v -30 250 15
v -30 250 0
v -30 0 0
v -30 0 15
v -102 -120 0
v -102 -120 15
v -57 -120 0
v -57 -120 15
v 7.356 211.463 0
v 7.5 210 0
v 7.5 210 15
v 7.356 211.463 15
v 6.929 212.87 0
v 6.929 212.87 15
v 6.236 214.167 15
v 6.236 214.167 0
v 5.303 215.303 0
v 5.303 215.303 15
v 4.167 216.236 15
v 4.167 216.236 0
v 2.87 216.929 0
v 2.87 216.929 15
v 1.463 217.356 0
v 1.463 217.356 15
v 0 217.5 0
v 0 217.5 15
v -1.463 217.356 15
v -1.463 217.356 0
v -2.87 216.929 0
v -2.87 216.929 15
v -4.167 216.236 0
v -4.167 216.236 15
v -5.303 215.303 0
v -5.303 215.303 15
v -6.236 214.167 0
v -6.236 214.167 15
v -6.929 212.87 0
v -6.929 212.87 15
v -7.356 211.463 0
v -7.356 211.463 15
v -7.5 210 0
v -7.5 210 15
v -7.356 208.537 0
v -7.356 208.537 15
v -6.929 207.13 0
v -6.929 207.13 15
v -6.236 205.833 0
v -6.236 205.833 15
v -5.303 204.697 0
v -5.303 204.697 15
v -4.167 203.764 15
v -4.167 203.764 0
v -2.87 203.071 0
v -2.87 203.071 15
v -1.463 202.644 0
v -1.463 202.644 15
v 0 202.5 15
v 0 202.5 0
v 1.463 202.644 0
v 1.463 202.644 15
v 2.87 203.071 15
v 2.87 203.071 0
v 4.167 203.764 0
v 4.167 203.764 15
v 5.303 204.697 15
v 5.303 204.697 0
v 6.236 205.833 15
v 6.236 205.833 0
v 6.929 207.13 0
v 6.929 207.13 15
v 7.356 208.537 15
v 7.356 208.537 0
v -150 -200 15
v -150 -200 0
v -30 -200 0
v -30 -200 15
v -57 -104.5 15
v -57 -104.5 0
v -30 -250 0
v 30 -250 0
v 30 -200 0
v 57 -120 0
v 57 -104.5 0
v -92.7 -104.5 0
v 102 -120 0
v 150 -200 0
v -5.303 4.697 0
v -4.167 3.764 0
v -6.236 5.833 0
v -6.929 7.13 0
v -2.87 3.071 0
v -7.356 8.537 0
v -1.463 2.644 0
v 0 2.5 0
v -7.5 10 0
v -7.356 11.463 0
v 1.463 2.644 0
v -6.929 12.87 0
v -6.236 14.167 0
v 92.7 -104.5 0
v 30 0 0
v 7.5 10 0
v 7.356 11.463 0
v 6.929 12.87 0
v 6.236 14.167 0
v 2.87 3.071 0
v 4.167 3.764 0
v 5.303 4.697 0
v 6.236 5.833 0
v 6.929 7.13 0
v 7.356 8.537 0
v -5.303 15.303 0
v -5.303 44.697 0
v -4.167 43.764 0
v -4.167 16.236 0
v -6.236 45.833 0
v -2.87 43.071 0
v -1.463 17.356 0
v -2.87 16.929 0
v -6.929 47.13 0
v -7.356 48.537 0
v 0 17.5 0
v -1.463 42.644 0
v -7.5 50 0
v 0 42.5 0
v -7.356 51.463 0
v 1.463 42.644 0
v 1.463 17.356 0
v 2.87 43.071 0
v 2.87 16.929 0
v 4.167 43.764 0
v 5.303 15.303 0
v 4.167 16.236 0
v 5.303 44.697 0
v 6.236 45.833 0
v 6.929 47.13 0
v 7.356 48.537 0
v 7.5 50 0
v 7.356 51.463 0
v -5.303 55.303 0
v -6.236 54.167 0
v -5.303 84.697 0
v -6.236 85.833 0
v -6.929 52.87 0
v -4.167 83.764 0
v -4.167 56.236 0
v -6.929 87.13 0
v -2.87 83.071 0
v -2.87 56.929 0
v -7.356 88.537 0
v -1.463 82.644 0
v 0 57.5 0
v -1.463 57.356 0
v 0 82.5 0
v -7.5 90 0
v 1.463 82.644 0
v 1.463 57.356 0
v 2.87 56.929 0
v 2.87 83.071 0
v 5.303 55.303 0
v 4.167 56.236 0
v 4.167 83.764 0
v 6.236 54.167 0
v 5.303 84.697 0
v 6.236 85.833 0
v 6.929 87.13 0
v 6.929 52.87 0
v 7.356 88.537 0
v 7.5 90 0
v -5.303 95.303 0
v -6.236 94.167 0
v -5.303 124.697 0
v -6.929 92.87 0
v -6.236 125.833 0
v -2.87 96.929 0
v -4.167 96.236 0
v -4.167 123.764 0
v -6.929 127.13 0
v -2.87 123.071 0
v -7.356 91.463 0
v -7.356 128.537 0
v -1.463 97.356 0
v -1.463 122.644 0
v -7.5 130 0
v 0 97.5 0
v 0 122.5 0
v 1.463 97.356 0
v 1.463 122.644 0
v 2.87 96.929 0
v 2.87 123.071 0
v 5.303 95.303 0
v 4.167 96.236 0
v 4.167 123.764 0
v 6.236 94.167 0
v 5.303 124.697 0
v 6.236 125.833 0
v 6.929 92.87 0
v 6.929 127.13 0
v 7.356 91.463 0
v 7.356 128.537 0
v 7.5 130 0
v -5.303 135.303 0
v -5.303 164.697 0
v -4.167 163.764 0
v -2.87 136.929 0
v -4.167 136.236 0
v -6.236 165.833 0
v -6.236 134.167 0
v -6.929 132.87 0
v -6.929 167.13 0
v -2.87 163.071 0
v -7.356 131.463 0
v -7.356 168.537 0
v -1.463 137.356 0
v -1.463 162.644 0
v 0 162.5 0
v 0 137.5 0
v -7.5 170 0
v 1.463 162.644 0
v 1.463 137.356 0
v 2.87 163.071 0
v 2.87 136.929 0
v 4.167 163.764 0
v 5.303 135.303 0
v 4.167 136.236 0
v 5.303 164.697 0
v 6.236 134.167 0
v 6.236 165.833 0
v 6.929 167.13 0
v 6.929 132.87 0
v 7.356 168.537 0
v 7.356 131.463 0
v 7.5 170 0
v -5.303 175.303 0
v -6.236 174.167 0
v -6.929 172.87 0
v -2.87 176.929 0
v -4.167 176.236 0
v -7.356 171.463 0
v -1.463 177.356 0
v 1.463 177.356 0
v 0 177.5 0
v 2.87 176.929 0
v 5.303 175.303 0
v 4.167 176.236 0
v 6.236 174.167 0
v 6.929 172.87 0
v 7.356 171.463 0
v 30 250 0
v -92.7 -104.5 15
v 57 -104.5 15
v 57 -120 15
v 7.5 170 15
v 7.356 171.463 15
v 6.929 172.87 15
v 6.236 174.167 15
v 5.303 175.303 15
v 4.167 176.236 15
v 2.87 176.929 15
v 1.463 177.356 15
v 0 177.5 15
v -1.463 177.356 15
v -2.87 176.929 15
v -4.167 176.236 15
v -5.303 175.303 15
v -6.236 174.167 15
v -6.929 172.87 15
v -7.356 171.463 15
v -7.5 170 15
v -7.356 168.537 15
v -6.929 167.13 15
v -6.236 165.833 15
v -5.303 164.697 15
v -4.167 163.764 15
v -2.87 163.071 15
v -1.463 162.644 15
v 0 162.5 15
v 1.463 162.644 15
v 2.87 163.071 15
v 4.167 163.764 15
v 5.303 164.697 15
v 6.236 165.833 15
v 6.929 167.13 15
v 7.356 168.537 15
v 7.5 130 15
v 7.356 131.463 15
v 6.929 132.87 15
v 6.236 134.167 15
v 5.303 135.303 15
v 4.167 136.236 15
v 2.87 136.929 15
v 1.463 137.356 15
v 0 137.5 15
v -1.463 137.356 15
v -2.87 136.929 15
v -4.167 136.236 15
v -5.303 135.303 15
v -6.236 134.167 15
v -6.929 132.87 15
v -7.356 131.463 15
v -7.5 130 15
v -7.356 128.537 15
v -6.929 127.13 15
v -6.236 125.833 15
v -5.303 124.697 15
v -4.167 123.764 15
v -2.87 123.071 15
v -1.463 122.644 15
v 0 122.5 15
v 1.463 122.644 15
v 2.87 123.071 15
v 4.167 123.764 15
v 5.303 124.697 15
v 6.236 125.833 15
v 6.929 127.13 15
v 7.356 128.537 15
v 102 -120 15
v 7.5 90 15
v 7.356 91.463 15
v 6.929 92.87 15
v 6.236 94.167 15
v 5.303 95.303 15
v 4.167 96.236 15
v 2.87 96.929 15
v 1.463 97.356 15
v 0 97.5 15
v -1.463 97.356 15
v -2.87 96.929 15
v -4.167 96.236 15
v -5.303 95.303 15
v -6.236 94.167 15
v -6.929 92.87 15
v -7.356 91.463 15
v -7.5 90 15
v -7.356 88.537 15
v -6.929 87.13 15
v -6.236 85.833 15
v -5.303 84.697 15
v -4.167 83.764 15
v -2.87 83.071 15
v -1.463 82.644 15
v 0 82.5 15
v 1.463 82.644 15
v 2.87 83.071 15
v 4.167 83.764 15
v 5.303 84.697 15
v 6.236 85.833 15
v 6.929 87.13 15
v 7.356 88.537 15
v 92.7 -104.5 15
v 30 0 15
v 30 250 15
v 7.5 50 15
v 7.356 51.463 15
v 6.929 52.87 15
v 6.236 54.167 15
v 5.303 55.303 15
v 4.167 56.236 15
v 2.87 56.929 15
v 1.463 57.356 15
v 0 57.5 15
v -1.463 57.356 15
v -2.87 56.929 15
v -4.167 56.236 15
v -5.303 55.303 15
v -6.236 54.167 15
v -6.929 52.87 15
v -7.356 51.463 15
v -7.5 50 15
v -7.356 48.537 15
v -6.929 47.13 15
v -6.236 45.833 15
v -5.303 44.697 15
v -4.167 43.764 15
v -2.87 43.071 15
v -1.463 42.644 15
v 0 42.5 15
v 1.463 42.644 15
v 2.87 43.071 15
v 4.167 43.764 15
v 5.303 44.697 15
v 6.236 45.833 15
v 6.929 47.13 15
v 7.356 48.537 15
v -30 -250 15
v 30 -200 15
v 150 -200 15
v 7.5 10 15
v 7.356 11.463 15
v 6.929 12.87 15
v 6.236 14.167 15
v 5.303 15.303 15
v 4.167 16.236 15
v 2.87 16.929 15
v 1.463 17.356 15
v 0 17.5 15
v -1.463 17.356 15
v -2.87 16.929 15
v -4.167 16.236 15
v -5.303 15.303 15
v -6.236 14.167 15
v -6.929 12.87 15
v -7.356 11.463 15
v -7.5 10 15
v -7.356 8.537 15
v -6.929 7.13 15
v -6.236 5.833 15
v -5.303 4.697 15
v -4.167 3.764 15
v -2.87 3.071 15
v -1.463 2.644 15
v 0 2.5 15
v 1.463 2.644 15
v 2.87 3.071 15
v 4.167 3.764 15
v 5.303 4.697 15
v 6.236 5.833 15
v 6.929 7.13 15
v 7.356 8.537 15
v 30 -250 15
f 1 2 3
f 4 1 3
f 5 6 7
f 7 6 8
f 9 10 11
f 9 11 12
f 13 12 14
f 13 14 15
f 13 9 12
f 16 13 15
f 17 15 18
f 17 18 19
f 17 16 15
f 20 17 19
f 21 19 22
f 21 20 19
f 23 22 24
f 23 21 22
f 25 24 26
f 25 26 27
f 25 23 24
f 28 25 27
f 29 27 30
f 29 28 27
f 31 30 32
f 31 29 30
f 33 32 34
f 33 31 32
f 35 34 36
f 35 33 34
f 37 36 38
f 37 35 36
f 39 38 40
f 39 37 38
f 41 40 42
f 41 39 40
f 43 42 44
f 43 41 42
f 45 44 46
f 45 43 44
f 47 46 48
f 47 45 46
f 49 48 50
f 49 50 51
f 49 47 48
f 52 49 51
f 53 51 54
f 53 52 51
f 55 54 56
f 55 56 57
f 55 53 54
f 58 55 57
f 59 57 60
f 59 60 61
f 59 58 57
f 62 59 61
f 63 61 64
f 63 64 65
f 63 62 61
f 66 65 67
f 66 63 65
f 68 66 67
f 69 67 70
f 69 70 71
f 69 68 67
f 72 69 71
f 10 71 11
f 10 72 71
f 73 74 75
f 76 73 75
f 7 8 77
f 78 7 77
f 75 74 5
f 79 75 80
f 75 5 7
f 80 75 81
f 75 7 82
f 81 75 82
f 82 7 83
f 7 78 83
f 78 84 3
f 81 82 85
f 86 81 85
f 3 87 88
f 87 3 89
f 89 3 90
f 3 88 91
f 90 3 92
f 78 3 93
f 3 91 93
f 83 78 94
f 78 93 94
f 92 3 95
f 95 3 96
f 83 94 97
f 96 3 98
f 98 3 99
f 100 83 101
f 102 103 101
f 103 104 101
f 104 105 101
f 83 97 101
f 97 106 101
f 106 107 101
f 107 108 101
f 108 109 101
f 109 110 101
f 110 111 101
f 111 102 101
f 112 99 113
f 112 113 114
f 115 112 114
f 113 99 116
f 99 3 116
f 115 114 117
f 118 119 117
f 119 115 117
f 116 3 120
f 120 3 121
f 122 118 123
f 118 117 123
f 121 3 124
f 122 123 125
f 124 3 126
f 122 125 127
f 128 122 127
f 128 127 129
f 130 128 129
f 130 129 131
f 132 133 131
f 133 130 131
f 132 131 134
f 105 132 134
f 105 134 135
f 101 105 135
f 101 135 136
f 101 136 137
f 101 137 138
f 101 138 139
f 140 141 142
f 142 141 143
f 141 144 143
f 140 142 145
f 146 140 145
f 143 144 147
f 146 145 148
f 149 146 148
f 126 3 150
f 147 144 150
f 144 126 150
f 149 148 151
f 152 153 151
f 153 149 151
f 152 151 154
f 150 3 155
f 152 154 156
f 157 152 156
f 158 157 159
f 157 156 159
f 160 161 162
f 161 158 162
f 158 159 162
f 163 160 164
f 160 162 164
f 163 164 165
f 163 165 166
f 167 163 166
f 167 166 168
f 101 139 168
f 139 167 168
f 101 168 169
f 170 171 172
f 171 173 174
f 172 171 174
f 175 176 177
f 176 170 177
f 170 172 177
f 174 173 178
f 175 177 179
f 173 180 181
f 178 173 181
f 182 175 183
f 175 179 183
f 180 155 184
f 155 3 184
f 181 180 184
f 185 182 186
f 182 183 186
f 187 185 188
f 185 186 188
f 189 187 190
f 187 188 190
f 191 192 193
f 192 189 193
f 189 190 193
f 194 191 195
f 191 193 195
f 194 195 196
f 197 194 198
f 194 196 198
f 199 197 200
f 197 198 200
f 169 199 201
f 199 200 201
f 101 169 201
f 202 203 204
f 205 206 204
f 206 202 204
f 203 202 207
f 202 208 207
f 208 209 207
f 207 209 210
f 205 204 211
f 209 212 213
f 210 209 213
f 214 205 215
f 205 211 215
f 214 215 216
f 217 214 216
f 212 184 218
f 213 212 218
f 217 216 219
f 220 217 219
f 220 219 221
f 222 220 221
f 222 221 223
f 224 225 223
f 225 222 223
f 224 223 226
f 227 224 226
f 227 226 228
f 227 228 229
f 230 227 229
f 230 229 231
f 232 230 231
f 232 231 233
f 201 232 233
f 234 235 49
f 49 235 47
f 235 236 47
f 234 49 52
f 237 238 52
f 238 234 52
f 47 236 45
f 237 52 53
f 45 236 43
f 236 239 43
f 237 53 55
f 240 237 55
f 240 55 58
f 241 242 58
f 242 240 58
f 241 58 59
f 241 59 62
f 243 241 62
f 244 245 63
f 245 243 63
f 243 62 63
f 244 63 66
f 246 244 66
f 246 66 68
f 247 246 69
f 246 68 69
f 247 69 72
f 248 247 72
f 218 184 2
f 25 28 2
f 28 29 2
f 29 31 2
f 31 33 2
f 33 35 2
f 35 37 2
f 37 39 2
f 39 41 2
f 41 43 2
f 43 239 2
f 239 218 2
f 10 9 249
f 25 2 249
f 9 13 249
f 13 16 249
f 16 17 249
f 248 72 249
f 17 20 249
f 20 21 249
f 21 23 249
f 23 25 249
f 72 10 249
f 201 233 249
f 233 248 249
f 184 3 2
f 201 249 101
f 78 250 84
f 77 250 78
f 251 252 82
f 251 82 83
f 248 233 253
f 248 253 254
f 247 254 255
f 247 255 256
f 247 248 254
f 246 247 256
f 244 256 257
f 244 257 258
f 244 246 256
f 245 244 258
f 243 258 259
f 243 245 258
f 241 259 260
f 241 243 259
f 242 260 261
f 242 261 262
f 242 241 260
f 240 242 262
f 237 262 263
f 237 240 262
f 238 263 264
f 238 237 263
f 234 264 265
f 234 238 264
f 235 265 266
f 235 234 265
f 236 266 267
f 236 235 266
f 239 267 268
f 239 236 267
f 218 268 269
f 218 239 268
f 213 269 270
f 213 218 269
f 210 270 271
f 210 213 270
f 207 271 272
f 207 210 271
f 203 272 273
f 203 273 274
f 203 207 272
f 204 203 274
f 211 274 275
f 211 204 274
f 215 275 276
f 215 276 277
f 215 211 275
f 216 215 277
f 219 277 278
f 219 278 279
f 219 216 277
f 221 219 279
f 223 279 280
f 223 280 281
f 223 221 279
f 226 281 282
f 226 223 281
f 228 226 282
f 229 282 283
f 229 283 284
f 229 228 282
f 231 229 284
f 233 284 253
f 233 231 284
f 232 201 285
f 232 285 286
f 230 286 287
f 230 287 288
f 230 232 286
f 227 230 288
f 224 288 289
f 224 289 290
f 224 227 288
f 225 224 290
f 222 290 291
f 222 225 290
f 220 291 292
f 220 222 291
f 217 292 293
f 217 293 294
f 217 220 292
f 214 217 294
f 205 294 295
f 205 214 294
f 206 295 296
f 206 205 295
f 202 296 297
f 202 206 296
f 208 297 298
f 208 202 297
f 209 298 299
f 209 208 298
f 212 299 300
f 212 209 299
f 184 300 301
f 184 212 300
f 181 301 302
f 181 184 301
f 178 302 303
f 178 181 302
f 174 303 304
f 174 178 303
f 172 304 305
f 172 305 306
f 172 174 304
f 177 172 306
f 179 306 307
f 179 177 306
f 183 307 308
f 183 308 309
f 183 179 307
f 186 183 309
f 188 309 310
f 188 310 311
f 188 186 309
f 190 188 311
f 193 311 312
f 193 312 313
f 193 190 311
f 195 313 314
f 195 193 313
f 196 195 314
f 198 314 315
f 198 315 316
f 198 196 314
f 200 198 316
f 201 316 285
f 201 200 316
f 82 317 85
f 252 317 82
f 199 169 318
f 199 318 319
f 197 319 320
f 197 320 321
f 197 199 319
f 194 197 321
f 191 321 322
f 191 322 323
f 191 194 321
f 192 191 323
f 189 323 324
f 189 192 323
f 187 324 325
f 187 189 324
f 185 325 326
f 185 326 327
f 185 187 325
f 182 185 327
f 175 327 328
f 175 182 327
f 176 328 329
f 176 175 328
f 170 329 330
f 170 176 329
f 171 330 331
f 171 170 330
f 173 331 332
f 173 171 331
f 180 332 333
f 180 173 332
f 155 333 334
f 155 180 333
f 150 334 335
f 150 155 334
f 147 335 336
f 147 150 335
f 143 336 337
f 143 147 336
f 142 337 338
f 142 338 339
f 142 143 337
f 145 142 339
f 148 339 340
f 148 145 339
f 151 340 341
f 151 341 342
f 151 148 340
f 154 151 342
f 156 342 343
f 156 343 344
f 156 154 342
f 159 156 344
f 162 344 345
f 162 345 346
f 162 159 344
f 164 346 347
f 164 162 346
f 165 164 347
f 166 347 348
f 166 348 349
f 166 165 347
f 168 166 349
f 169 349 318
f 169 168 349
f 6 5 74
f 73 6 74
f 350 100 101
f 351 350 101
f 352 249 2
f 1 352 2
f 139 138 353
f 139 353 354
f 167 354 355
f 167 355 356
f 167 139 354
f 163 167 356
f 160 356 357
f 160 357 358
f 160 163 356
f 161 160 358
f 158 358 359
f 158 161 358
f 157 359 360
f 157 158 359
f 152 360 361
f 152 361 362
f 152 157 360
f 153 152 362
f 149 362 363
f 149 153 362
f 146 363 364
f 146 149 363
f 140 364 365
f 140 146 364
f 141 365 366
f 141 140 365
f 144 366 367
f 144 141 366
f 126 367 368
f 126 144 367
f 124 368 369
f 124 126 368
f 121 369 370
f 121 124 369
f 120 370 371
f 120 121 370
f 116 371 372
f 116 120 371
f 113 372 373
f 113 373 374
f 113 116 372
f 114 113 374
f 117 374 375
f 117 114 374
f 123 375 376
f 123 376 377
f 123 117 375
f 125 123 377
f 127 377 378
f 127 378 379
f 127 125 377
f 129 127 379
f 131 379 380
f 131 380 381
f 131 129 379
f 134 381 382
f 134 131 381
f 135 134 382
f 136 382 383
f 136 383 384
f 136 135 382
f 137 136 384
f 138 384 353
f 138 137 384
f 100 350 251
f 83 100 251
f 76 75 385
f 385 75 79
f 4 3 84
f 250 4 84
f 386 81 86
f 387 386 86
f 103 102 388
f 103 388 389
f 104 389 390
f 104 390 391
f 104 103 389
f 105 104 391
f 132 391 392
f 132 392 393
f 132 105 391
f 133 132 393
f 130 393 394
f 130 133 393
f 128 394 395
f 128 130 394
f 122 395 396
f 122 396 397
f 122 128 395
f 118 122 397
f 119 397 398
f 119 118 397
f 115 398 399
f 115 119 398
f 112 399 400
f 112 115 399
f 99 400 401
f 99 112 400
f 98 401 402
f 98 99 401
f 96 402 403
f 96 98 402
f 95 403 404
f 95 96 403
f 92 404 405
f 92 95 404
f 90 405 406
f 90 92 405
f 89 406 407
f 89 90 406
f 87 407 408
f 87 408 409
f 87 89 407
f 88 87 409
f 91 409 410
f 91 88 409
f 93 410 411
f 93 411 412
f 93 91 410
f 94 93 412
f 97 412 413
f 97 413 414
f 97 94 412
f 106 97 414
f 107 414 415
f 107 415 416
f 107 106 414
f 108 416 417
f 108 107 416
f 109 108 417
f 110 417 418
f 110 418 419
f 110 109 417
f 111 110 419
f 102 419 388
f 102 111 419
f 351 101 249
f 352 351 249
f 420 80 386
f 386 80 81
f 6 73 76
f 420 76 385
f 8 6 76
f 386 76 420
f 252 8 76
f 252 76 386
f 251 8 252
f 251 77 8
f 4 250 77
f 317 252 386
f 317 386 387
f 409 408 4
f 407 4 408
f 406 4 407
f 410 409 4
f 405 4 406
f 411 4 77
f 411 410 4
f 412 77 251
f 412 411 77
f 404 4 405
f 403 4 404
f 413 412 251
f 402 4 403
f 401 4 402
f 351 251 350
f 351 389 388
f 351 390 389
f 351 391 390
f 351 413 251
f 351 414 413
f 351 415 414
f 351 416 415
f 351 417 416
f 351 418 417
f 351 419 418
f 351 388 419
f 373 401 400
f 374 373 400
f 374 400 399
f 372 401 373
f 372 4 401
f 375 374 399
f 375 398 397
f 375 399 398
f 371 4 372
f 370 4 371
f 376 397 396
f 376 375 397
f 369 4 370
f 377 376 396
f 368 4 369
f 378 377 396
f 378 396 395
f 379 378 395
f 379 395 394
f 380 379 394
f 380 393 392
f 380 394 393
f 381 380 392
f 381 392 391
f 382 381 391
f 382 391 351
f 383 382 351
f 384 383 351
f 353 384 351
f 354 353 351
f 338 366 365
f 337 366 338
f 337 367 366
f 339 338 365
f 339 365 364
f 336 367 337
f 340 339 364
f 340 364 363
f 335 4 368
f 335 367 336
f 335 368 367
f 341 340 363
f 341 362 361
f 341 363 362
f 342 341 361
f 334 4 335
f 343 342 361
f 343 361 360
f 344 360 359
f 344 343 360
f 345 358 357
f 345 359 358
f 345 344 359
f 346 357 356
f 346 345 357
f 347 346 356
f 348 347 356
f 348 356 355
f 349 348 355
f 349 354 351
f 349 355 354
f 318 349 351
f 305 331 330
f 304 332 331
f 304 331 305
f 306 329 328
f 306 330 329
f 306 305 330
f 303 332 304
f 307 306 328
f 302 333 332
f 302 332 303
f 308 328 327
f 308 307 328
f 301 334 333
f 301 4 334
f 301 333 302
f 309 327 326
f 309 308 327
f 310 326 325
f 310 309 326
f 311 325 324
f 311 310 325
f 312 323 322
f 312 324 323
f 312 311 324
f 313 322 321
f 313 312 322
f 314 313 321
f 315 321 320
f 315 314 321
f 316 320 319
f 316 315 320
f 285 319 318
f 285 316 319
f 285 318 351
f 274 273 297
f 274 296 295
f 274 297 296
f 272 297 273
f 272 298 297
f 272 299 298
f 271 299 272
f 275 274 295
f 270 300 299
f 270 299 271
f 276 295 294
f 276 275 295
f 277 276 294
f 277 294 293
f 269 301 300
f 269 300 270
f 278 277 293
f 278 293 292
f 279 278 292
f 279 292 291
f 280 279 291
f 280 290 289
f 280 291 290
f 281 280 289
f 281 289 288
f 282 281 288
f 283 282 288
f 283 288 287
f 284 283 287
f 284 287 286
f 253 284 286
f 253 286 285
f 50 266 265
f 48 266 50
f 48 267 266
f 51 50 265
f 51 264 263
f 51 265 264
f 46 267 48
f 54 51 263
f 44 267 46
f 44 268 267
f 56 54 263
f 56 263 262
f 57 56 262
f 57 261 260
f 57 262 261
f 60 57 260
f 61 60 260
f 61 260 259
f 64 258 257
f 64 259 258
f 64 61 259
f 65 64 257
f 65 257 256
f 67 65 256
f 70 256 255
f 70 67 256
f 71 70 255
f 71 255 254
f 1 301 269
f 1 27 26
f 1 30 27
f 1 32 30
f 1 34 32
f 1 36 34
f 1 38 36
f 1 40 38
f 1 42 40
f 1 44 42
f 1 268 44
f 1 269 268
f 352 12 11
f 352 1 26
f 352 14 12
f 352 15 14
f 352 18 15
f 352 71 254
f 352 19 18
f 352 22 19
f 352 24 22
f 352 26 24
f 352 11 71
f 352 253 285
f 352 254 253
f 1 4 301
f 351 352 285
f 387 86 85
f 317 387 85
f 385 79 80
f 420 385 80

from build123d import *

# Parameters (mm, degrees)
ESQUISSE1_R             = 7.5
BOSS_EXTRU_1_DEPTH      = 15
ESQUISSE2_W             = 90.989913166
ESQUISSE2_H             = 15.5
ENL_V_MAT_EXTRU_1_DEPTH = 15


with BuildPart() as part:
    # Esquisse1 → Boss.-Extru.1 (new body)
    with BuildSketch(Plane.XY):
        Polygon((-30, 0), (-150, -200), (-30, -200), (-30, -250), (30, -250), (30, -200), (150, -200), (30, 0), (30, 250), (-30, 250), align=None)
        with Locations((0, 210)):
            Circle(ESQUISSE1_R, mode=Mode.SUBTRACT)
        with Locations((0, 170)):
            Circle(ESQUISSE1_R, mode=Mode.SUBTRACT)
        with Locations((0, 130)):
            Circle(ESQUISSE1_R, mode=Mode.SUBTRACT)
        with Locations((0, 90)):
            Circle(ESQUISSE1_R, mode=Mode.SUBTRACT)
        with Locations((0, 50)):
            Circle(ESQUISSE1_R, mode=Mode.SUBTRACT)
        with Locations((0, 10)):
            Circle(ESQUISSE1_R, mode=Mode.SUBTRACT)
    extrude(amount=BOSS_EXTRU_1_DEPTH)

    # Esquisse2 → Enlèv. mat.-Extru.1 (cut)
    with BuildSketch(Plane.XY.offset(15)):
        with Locations((-102.494956583, -112.25)):
            Rectangle(ESQUISSE2_W, ESQUISSE2_H)
    enl_v_mat_extru_1 = extrude(amount=-ENL_V_MAT_EXTRU_1_DEPTH, mode=Mode.SUBTRACT)

    # Symétrie1: Enlèv. mat.-Extru.1 across plane
    add(enl_v_mat_extru_1.mirror(Plane(origin=(0, 0, 0), x_dir=(0, 0, 1), z_dir=(1, 0, 0))), mode=Mode.SUBTRACT)


solid = part.part
